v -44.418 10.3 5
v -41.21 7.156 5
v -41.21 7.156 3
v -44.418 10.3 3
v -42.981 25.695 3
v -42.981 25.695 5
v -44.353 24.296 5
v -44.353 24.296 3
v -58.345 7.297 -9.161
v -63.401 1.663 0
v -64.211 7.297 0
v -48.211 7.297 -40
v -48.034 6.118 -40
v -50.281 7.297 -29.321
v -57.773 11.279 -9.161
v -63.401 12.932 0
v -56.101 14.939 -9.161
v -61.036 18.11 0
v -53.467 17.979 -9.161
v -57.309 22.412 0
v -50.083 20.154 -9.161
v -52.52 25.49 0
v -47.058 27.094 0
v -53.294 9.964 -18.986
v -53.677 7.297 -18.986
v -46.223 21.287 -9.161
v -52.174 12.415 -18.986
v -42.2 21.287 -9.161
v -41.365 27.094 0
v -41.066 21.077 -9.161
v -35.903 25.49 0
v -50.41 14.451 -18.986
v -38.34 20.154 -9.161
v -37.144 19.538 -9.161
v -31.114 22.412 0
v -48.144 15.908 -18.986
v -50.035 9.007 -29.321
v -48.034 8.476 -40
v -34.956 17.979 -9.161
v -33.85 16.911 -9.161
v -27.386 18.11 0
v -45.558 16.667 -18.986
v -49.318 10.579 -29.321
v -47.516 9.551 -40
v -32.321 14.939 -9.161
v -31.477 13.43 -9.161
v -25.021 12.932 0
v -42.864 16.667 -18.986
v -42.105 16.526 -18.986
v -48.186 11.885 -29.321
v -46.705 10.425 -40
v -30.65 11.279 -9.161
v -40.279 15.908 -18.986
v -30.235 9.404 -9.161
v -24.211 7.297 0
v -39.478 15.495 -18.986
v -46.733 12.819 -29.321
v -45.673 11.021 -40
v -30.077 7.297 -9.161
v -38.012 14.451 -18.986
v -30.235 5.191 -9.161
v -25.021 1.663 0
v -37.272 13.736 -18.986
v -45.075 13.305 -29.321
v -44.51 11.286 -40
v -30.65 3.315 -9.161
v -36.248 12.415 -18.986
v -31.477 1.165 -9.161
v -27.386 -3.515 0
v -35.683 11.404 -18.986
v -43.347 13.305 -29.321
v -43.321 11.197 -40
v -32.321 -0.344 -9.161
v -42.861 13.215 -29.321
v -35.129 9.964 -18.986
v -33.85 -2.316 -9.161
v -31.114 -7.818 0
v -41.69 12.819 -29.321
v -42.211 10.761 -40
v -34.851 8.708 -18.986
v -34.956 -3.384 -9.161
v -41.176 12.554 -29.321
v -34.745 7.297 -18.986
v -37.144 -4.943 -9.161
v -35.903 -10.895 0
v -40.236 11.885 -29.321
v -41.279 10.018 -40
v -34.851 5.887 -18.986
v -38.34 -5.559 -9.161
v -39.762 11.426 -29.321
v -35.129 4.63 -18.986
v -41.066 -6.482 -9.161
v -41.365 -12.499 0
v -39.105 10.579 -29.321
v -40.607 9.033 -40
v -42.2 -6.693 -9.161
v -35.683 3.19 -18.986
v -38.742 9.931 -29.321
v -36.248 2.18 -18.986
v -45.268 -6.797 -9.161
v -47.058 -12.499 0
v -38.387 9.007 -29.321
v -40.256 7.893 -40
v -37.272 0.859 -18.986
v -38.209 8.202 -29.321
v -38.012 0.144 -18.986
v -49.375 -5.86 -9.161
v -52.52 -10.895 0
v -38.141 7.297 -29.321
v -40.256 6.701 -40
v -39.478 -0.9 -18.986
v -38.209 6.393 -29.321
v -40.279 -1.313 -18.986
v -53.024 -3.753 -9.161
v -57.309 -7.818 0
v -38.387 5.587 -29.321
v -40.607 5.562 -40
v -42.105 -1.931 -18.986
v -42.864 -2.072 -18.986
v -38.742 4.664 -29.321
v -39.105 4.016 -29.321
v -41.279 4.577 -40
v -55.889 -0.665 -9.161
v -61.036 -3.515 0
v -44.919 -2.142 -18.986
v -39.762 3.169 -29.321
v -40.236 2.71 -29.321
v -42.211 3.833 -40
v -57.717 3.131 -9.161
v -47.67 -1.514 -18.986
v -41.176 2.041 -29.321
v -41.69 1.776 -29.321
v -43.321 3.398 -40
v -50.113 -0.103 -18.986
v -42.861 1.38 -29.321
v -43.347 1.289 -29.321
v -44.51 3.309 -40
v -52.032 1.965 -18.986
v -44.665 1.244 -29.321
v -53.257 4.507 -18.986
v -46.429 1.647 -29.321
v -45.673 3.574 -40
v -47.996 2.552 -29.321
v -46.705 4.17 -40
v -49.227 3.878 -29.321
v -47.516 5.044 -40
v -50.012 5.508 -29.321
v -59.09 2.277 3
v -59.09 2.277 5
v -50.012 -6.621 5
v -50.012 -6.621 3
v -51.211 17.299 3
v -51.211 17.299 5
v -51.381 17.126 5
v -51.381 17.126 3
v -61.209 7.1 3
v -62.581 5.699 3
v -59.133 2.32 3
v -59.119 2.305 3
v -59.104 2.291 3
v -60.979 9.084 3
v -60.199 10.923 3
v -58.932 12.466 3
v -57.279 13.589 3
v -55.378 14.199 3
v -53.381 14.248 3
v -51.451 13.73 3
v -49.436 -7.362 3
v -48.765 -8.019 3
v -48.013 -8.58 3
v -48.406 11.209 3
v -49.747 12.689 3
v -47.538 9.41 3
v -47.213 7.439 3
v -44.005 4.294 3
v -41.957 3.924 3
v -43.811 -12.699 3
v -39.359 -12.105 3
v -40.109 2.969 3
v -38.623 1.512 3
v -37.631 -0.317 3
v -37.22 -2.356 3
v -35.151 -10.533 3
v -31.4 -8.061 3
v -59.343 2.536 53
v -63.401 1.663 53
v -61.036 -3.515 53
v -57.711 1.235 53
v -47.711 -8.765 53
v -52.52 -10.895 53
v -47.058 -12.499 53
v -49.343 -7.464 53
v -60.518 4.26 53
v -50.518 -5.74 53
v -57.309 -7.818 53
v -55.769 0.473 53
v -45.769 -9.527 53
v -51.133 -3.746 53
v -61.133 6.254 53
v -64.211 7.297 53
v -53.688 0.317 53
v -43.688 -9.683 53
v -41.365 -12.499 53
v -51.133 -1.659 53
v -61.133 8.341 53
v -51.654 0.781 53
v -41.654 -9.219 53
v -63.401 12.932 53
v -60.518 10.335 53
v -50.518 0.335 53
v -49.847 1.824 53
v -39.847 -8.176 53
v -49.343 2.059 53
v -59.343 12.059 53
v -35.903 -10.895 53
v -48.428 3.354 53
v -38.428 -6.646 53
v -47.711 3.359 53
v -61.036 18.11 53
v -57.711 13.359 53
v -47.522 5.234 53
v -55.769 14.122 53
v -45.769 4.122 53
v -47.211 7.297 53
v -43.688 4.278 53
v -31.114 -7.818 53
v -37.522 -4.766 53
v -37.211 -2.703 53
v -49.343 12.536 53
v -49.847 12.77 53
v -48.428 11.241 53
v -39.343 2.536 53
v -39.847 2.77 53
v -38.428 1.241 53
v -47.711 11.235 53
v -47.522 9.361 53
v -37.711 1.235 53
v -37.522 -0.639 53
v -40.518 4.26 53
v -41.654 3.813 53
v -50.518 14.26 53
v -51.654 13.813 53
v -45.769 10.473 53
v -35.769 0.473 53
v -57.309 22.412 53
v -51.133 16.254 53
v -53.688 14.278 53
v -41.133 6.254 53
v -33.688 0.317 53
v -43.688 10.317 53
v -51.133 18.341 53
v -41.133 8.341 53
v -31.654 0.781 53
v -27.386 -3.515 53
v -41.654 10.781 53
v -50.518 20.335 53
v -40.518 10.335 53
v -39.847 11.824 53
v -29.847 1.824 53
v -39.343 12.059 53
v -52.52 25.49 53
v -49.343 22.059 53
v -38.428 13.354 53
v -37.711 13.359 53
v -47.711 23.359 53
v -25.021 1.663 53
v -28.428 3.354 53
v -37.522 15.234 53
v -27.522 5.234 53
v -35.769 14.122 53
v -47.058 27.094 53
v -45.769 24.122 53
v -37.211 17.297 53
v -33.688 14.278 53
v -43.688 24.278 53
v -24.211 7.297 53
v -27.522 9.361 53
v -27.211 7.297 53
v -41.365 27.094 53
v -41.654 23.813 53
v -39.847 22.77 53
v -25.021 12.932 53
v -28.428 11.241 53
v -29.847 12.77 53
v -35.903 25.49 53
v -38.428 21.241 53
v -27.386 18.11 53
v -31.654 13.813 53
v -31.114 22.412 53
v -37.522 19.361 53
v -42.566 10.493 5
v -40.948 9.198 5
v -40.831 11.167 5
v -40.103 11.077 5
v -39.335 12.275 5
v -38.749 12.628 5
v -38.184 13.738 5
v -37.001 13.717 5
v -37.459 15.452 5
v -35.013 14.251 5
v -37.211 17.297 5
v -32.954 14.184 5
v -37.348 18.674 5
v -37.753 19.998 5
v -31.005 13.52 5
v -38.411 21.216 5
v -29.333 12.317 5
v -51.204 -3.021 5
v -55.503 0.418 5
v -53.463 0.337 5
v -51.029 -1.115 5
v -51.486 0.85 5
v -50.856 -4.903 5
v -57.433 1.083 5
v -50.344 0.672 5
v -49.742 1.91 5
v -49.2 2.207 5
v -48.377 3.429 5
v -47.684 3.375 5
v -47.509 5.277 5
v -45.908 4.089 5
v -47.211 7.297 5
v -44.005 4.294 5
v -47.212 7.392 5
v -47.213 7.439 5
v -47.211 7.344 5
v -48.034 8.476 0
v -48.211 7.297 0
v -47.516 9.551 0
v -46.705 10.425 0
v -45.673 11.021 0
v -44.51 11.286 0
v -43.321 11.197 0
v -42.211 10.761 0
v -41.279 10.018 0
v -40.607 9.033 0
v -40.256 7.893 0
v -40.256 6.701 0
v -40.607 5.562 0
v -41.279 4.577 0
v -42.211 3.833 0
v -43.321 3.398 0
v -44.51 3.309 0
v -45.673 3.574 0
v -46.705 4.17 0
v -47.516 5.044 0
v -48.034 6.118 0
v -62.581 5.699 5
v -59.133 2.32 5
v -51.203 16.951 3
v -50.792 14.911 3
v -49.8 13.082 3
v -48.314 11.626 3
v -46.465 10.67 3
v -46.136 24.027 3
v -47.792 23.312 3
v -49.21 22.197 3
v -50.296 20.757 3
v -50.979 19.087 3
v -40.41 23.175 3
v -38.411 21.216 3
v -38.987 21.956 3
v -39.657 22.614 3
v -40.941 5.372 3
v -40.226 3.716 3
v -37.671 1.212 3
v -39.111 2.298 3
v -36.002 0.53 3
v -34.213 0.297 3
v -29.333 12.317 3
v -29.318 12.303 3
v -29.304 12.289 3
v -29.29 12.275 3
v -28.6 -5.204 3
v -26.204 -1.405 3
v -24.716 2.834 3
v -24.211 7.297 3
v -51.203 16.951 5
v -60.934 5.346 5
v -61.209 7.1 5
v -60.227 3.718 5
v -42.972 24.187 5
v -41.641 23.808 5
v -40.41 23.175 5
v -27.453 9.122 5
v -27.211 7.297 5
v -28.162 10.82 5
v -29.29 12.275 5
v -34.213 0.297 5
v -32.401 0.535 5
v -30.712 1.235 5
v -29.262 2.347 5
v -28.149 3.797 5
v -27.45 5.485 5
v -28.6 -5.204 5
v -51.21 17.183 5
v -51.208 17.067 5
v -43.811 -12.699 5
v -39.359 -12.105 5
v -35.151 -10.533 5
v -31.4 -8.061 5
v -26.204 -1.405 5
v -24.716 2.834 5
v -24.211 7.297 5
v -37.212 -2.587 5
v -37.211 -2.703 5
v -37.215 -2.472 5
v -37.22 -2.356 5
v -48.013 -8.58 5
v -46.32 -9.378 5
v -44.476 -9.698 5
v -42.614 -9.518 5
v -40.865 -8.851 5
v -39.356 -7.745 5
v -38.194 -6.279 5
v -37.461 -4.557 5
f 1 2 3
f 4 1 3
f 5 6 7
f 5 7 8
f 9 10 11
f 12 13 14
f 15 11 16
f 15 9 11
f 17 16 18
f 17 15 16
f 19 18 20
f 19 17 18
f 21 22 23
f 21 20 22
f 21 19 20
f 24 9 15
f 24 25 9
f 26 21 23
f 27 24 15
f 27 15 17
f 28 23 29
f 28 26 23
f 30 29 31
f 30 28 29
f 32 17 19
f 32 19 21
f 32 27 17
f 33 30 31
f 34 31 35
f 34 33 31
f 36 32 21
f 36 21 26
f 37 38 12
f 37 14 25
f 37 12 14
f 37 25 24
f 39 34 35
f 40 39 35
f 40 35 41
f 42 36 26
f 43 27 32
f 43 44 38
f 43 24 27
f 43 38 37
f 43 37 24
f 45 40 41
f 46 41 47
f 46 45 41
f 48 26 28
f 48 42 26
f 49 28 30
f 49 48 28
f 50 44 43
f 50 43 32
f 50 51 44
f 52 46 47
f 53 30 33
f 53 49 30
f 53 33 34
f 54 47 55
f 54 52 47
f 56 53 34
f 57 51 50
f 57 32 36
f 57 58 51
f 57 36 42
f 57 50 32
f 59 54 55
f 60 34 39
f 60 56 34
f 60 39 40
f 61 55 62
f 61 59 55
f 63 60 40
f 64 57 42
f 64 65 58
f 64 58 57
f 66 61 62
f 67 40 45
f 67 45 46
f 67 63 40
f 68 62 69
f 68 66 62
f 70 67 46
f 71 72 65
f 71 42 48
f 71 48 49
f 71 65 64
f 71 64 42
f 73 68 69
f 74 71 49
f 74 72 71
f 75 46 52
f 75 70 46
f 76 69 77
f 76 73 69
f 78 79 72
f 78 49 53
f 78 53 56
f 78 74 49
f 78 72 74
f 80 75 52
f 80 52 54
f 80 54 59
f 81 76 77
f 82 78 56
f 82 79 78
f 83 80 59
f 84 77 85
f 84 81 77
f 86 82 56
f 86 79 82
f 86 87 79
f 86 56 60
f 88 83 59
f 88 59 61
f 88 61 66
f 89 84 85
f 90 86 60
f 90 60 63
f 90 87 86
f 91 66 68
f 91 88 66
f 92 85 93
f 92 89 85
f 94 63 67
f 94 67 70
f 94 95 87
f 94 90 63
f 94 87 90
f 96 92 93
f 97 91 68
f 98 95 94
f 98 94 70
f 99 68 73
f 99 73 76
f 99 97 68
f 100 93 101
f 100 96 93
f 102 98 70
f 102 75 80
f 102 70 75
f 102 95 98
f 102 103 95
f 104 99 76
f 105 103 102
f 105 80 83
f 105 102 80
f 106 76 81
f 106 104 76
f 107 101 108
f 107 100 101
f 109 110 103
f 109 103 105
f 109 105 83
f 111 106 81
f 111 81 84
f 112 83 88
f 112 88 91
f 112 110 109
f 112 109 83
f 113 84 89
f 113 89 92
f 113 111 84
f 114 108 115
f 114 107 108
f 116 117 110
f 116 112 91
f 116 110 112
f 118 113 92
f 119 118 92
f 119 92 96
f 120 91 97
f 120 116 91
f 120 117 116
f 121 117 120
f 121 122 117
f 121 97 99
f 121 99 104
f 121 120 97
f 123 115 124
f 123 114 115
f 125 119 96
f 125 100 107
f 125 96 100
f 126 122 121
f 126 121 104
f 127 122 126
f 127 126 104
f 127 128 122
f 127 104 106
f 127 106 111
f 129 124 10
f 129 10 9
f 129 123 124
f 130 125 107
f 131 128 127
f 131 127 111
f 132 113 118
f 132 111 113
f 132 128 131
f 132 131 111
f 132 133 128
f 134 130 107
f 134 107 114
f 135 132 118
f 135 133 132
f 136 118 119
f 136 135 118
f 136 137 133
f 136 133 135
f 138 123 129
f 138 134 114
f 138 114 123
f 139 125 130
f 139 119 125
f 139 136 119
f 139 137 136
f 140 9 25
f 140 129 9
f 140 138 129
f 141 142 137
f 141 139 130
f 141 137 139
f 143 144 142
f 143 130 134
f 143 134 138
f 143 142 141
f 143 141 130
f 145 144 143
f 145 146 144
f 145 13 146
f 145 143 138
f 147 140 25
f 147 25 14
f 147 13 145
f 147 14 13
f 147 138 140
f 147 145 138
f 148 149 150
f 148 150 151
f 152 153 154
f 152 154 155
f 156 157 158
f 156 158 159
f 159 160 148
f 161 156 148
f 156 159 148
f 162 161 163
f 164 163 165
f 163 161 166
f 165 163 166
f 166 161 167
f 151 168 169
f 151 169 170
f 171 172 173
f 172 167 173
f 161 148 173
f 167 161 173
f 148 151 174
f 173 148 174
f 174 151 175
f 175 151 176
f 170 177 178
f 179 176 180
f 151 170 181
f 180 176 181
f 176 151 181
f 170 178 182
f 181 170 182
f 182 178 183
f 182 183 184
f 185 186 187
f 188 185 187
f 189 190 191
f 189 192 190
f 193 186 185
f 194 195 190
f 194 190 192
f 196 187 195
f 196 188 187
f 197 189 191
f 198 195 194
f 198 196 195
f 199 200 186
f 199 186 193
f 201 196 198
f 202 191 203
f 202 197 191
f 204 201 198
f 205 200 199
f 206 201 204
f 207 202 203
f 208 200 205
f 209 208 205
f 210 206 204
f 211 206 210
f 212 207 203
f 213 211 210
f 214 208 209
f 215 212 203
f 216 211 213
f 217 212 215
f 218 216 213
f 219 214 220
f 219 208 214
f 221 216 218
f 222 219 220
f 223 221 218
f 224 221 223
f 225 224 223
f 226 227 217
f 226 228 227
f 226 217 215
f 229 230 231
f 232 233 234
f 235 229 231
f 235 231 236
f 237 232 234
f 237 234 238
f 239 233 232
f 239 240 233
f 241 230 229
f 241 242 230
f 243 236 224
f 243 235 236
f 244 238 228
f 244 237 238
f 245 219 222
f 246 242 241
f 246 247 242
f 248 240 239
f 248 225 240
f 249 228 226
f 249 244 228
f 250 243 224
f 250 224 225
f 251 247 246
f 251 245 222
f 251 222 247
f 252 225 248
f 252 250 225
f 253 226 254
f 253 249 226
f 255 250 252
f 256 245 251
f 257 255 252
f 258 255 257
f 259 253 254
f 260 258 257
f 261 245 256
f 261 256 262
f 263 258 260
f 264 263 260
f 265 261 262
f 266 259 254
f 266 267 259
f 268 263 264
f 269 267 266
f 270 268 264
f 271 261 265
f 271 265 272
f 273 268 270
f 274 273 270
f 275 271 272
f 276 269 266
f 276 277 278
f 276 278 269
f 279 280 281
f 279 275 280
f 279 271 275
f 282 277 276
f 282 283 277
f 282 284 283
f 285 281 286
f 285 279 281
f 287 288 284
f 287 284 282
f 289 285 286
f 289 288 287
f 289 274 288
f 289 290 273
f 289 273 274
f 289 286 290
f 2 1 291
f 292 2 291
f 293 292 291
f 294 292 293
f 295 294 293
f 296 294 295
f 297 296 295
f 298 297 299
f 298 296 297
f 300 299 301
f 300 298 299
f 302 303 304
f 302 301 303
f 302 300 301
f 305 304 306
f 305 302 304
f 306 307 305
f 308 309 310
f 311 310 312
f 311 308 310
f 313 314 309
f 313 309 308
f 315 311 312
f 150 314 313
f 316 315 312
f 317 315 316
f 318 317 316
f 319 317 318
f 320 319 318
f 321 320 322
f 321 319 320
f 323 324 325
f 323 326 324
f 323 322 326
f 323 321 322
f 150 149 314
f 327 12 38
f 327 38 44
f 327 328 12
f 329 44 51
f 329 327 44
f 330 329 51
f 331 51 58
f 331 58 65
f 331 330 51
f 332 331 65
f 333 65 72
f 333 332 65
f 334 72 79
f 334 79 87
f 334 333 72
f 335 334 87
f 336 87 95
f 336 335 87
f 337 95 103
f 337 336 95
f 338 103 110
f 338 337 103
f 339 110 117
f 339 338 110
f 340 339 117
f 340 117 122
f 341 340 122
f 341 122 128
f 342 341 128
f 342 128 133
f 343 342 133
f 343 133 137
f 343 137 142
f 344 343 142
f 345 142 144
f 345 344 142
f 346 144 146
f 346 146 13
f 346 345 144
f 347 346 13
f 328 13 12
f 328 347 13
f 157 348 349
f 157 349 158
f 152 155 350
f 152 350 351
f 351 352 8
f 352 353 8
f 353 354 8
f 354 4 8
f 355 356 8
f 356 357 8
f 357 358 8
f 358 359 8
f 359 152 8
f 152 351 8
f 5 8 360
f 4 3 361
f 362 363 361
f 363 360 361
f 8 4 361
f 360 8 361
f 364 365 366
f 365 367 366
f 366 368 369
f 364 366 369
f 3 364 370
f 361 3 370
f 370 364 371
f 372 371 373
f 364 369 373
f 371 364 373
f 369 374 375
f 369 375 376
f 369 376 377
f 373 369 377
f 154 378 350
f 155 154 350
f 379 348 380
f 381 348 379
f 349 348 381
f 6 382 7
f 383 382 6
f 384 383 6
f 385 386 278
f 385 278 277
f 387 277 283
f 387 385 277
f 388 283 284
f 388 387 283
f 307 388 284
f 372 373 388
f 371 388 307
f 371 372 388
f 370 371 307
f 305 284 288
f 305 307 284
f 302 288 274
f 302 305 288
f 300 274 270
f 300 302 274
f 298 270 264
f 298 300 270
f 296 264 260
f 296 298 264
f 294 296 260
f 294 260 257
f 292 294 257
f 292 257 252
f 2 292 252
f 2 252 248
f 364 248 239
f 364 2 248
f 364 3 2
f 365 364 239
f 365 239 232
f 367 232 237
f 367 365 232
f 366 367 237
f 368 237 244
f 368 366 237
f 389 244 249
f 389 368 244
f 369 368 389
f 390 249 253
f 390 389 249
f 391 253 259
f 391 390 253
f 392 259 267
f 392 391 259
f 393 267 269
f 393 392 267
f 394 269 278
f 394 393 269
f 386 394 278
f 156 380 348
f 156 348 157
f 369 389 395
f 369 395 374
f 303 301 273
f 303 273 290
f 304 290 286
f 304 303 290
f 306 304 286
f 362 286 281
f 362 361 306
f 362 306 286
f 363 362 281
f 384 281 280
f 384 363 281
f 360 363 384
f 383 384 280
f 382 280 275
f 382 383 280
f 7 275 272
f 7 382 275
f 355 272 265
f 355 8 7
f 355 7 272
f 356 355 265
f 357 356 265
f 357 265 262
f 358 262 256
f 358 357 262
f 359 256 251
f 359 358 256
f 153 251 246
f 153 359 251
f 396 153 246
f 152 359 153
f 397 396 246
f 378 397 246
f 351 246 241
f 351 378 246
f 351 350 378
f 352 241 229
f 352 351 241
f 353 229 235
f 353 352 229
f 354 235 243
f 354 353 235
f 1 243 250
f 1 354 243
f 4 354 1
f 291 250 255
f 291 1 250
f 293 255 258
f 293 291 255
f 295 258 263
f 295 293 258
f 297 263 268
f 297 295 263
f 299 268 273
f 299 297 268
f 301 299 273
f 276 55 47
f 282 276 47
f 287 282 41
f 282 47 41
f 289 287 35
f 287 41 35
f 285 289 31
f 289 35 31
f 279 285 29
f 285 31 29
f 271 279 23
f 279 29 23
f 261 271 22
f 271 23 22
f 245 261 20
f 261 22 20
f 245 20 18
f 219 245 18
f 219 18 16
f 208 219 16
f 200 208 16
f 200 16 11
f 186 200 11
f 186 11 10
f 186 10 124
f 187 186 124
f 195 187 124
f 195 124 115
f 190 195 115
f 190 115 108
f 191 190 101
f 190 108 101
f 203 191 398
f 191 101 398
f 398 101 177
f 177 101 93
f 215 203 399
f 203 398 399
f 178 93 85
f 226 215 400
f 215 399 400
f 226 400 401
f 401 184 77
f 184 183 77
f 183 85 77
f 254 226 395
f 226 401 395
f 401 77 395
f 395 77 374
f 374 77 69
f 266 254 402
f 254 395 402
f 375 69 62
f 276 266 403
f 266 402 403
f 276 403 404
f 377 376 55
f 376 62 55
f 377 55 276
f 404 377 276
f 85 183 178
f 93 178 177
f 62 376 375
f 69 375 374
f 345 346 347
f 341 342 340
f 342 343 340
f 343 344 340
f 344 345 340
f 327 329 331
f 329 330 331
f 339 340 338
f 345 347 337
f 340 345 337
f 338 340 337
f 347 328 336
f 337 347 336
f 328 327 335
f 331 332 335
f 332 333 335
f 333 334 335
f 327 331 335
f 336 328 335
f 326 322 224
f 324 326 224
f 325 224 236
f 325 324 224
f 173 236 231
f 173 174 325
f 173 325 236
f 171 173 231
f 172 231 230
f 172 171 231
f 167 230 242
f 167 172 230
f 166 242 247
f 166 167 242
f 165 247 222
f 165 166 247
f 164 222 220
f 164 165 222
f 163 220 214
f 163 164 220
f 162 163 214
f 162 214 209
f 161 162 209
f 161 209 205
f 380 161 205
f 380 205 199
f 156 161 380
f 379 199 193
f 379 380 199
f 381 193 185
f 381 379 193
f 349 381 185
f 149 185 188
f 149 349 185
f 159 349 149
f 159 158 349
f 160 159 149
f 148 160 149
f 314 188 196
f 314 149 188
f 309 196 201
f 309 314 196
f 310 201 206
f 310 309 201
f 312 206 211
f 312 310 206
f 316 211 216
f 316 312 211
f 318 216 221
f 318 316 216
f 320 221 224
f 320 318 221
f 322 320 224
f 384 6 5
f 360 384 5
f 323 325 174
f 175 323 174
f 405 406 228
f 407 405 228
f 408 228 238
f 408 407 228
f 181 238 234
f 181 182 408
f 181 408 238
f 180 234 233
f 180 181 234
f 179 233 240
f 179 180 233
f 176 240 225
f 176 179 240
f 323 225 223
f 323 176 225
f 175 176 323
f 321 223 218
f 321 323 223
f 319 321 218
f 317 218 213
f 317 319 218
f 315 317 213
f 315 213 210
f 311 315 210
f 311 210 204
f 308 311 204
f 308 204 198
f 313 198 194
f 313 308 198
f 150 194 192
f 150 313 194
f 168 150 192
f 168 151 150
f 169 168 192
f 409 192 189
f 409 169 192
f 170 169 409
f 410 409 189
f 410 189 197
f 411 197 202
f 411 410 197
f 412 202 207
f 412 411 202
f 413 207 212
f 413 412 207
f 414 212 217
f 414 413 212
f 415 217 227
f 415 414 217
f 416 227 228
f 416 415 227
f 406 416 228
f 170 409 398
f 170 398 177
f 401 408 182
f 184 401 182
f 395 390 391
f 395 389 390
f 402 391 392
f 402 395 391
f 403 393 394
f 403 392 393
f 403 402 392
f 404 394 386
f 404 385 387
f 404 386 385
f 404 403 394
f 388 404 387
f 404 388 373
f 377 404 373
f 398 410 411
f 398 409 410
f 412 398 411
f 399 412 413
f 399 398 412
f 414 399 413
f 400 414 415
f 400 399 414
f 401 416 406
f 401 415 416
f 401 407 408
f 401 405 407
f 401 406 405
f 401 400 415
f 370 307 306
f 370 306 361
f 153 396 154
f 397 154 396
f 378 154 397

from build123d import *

# Parameters (mm, degrees)
CROQUIS1_R              = 20
SALIENTE_EXTRUIR1_DEPTH = 3
CROQUIS2_R              = 20
CROQUIS2_R_2            = 7
SALIENTE_EXTRUIR2_DEPTH = 50
CROQUIS6_W              = 2
CROQUIS6_H              = 12
CORTAR_EXTRUIR1_DEPTH   = 32


with BuildPart() as part:
    # Croquis1 → Saliente-Extruir1 (new body)
    with BuildSketch(Plane.XY):
        with Locations((-44.21130789, 7.297319347)):
            Circle(CROQUIS1_R)
    extrude(amount=SALIENTE_EXTRUIR1_DEPTH)

    # Croquis2 → Saliente-Extruir2 (add)
    with BuildSketch(Plane.XY.offset(3)):
        with Locations((-44.21130789, 7.297319347)):
            Circle(CROQUIS2_R)
        with Locations((-44.21130789, 17.297319347)):
            Circle(CROQUIS2_R_2, mode=Mode.SUBTRACT)
        with Locations((-34.21130789, 7.297319347)):
            Circle(CROQUIS2_R_2, mode=Mode.SUBTRACT)
        with Locations((-44.21130789, -2.702680653)):
            Circle(CROQUIS2_R_2, mode=Mode.SUBTRACT)
        with Locations((-54.21130789, 7.297319347)):
            Circle(CROQUIS2_R_2, mode=Mode.SUBTRACT)
    extrude(amount=SALIENTE_EXTRUIR2_DEPTH)

    # Croquis4 → Revolución1 (revolve)
    with BuildSketch(Plane(origin=(0, 7.297319347, 0), x_dir=(1, 0, 0), z_dir=(0, 1, 0))):
        with BuildLine():
            Line((-48.21130789, 0), (-64.21130789, 0))
            ThreePointArc((-64.21130789, 0), (-53.677160121, 18.986340893), (-48.21130789, 40))
            Line((-48.21130789, 40), (-48.21130789, 0))
        make_face()
    revolve(axis=Axis((-44.21130789, 7.297319347, 0), (0, 0, -1)))

    # Croquis6 → Cortar-Extruir1 (cut)
    with BuildSketch(Plane(origin=(-11.912562698, 11.676862537, 0), x_dir=(0, 0, -1), z_dir=(0.714136384, -0.700006589, 0))):
        with Locations((-4, -17.736925603)):
            Rectangle(CROQUIS6_W, CROQUIS6_H)
        with Locations((-4, -33.736925603)):
            Rectangle(CROQUIS6_W, CROQUIS6_H)
    extrude(amount=-CORTAR_EXTRUIR1_DEPTH, mode=Mode.SUBTRACT)


solid = part.part
